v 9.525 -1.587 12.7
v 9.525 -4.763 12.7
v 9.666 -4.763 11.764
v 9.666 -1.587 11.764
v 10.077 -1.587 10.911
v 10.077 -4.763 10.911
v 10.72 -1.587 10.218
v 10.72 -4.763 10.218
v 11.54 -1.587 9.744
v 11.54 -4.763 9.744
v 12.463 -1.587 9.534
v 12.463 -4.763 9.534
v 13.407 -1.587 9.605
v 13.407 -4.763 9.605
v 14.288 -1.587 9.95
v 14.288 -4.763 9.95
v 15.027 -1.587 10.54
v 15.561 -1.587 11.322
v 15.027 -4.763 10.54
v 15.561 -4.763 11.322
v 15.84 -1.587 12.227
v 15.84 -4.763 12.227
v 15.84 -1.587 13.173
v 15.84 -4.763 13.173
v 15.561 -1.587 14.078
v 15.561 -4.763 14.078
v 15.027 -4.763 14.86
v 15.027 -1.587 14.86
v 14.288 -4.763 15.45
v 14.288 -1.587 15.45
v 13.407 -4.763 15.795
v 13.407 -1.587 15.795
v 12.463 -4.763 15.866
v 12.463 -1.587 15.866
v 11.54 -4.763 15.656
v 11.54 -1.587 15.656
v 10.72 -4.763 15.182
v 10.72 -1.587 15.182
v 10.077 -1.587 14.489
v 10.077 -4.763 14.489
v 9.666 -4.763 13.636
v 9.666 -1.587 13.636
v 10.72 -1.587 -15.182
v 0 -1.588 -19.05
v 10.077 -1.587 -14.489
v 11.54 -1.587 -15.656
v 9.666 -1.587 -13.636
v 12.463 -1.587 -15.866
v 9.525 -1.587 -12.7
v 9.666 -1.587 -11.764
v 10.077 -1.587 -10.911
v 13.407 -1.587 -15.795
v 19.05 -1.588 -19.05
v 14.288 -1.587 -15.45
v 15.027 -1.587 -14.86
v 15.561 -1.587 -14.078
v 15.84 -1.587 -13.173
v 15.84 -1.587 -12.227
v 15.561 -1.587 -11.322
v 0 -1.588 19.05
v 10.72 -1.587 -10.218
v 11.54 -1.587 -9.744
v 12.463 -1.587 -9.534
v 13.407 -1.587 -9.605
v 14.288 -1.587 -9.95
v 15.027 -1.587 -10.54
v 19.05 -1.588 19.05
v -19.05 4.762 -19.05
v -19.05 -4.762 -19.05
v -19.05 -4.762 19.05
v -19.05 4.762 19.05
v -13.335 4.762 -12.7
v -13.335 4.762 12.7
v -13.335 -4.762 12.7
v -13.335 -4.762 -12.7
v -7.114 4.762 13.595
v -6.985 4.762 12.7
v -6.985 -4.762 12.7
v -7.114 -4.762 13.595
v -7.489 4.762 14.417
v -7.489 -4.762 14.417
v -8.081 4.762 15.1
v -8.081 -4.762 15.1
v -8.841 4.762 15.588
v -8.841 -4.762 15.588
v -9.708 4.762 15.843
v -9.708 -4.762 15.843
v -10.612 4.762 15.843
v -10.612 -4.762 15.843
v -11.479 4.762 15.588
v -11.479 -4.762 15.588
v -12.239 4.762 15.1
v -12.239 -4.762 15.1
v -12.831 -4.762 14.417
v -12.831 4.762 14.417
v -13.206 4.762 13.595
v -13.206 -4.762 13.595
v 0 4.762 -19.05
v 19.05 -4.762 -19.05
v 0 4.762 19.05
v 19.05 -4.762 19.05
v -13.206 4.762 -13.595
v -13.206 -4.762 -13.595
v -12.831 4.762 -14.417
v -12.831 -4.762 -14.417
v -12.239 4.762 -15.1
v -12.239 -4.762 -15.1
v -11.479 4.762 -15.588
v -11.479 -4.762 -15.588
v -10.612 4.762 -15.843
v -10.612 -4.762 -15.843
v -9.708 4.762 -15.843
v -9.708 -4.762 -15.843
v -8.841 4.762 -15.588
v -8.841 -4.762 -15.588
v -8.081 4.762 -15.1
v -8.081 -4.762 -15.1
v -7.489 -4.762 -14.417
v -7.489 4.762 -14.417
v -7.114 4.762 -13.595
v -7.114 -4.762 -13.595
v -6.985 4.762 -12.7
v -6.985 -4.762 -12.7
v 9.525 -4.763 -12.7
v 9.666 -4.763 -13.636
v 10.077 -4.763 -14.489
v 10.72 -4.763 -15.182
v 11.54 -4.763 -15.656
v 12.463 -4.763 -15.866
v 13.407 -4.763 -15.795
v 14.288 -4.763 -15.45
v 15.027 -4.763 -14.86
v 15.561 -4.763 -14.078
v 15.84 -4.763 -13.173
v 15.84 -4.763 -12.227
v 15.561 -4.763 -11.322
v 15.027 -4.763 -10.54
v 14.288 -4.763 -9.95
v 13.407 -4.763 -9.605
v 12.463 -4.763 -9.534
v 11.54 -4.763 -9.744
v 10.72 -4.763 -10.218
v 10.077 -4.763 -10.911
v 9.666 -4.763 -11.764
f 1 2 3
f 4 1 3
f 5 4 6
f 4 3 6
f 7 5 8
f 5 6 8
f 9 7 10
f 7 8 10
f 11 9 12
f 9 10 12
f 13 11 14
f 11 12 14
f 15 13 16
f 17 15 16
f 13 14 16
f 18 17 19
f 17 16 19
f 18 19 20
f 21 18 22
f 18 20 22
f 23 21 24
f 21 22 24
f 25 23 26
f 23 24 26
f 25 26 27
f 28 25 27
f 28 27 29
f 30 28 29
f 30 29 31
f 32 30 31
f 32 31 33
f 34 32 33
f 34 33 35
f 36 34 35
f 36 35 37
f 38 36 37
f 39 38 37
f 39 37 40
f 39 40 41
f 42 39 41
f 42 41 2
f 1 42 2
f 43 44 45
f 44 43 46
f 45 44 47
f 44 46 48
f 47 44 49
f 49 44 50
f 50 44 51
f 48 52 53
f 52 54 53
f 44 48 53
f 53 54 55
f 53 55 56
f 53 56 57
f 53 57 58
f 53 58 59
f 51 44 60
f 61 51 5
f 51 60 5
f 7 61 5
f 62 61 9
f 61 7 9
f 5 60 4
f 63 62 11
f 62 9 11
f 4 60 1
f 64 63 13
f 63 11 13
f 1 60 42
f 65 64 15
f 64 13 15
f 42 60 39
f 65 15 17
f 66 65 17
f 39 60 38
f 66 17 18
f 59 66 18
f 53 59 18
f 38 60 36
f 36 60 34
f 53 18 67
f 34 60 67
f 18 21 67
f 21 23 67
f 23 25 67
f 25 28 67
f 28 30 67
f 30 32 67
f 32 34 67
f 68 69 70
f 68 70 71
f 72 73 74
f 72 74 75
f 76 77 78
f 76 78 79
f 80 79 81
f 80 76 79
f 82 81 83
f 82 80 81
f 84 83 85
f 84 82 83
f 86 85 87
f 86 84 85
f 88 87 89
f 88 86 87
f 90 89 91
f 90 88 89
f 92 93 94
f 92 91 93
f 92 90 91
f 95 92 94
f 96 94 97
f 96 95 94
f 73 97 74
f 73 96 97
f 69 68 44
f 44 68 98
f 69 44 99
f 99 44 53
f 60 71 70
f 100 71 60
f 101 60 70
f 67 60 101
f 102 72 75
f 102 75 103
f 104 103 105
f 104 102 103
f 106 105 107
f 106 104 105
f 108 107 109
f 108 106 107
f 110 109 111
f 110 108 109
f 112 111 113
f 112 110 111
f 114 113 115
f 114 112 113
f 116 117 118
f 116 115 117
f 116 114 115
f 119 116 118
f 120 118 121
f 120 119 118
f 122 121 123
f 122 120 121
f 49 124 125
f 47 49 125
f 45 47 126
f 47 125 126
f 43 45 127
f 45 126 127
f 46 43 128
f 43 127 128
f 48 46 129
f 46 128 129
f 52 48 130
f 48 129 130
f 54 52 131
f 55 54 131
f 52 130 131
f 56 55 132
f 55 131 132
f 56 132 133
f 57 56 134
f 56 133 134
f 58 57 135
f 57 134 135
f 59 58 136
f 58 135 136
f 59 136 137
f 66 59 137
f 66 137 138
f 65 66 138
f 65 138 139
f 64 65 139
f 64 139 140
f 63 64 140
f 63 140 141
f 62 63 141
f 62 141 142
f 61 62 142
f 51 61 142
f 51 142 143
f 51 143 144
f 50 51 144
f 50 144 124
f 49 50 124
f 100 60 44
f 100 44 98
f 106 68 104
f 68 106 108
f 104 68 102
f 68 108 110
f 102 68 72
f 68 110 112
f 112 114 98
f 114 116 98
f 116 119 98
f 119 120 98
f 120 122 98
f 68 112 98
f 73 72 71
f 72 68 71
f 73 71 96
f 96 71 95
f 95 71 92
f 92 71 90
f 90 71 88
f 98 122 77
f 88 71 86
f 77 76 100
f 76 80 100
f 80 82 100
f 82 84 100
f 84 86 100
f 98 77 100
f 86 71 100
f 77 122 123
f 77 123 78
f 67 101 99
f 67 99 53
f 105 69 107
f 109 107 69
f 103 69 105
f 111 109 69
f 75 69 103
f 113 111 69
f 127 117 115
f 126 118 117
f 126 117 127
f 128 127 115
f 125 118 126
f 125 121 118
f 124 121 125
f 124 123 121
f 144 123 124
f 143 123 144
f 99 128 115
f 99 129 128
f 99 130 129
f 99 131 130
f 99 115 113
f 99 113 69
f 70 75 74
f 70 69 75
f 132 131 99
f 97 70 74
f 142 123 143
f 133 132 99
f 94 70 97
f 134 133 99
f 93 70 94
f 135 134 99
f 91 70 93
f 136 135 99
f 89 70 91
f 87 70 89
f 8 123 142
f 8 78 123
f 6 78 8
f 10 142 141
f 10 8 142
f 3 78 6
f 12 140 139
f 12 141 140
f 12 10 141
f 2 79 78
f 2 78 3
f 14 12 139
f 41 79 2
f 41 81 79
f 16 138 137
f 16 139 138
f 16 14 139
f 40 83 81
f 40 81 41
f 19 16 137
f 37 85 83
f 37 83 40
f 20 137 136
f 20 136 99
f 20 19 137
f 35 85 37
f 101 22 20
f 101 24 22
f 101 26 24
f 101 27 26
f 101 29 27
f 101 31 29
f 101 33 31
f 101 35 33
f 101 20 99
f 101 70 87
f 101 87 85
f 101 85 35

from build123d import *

# Parameters (mm, degrees)
SKETCH1_W                   = 38.1
SKETCH1_H                   = 9.525
BOSS_EXTRUDE1_DEPTH         = 19.05
SKETCH2_W                   = 19.05
SKETCH2_H                   = 6.35
CUT_EXTRUDE1_DEPTH          = 43.8625
F_1_4_0_25_DIAMETER_HOLE2_D = 6.35
CUT_EXTRUDE2_DEPTH          = 31.75


with BuildPart() as part:
    # Sketch1 → Boss-Extrude1 (new, symmetric)
    with BuildSketch(Plane.XY):
        Rectangle(SKETCH1_W, SKETCH1_H)
    extrude(amount=BOSS_EXTRUDE1_DEPTH, both=True)

    # Sketch2 → Cut-Extrude1 (cut, through all)
    with BuildSketch(Plane.XY.offset(19.05)):
        with Locations((9.525, 1.5875)):
            Rectangle(SKETCH2_W, SKETCH2_H)
    extrude(amount=-CUT_EXTRUDE1_DEPTH, mode=Mode.SUBTRACT)

    # 1/4 (0.25) Diameter Hole2 (through all)
    with Locations(Plane(origin=(0, -1.5875, 0), x_dir=(1, 0, 0), z_dir=(0, 1, 0))):
        with Locations((12.7, 12.7), (12.7, -12.7)):
            Hole(F_1_4_0_25_DIAMETER_HOLE2_D / 2)

    # Sketch11 → Cut-Extrude2 (cut)
    with BuildSketch(Plane(origin=(0, 4.7625, 0), x_dir=(1, 0, 0), z_dir=(0, 1, 0))):
        with BuildLine():
            Line((-13.335, -12.7), (-13.335, 12.7))
            ThreePointArc((-13.335, 12.7), (-10.16, 15.875), (-6.985, 12.7))
            Line((-6.985, 12.7), (-6.985, -12.7))
            ThreePointArc((-6.985, -12.7), (-10.16, -15.875), (-13.335, -12.7))
        make_face()
    extrude(amount=-CUT_EXTRUDE2_DEPTH, mode=Mode.SUBTRACT)


solid = part.part
